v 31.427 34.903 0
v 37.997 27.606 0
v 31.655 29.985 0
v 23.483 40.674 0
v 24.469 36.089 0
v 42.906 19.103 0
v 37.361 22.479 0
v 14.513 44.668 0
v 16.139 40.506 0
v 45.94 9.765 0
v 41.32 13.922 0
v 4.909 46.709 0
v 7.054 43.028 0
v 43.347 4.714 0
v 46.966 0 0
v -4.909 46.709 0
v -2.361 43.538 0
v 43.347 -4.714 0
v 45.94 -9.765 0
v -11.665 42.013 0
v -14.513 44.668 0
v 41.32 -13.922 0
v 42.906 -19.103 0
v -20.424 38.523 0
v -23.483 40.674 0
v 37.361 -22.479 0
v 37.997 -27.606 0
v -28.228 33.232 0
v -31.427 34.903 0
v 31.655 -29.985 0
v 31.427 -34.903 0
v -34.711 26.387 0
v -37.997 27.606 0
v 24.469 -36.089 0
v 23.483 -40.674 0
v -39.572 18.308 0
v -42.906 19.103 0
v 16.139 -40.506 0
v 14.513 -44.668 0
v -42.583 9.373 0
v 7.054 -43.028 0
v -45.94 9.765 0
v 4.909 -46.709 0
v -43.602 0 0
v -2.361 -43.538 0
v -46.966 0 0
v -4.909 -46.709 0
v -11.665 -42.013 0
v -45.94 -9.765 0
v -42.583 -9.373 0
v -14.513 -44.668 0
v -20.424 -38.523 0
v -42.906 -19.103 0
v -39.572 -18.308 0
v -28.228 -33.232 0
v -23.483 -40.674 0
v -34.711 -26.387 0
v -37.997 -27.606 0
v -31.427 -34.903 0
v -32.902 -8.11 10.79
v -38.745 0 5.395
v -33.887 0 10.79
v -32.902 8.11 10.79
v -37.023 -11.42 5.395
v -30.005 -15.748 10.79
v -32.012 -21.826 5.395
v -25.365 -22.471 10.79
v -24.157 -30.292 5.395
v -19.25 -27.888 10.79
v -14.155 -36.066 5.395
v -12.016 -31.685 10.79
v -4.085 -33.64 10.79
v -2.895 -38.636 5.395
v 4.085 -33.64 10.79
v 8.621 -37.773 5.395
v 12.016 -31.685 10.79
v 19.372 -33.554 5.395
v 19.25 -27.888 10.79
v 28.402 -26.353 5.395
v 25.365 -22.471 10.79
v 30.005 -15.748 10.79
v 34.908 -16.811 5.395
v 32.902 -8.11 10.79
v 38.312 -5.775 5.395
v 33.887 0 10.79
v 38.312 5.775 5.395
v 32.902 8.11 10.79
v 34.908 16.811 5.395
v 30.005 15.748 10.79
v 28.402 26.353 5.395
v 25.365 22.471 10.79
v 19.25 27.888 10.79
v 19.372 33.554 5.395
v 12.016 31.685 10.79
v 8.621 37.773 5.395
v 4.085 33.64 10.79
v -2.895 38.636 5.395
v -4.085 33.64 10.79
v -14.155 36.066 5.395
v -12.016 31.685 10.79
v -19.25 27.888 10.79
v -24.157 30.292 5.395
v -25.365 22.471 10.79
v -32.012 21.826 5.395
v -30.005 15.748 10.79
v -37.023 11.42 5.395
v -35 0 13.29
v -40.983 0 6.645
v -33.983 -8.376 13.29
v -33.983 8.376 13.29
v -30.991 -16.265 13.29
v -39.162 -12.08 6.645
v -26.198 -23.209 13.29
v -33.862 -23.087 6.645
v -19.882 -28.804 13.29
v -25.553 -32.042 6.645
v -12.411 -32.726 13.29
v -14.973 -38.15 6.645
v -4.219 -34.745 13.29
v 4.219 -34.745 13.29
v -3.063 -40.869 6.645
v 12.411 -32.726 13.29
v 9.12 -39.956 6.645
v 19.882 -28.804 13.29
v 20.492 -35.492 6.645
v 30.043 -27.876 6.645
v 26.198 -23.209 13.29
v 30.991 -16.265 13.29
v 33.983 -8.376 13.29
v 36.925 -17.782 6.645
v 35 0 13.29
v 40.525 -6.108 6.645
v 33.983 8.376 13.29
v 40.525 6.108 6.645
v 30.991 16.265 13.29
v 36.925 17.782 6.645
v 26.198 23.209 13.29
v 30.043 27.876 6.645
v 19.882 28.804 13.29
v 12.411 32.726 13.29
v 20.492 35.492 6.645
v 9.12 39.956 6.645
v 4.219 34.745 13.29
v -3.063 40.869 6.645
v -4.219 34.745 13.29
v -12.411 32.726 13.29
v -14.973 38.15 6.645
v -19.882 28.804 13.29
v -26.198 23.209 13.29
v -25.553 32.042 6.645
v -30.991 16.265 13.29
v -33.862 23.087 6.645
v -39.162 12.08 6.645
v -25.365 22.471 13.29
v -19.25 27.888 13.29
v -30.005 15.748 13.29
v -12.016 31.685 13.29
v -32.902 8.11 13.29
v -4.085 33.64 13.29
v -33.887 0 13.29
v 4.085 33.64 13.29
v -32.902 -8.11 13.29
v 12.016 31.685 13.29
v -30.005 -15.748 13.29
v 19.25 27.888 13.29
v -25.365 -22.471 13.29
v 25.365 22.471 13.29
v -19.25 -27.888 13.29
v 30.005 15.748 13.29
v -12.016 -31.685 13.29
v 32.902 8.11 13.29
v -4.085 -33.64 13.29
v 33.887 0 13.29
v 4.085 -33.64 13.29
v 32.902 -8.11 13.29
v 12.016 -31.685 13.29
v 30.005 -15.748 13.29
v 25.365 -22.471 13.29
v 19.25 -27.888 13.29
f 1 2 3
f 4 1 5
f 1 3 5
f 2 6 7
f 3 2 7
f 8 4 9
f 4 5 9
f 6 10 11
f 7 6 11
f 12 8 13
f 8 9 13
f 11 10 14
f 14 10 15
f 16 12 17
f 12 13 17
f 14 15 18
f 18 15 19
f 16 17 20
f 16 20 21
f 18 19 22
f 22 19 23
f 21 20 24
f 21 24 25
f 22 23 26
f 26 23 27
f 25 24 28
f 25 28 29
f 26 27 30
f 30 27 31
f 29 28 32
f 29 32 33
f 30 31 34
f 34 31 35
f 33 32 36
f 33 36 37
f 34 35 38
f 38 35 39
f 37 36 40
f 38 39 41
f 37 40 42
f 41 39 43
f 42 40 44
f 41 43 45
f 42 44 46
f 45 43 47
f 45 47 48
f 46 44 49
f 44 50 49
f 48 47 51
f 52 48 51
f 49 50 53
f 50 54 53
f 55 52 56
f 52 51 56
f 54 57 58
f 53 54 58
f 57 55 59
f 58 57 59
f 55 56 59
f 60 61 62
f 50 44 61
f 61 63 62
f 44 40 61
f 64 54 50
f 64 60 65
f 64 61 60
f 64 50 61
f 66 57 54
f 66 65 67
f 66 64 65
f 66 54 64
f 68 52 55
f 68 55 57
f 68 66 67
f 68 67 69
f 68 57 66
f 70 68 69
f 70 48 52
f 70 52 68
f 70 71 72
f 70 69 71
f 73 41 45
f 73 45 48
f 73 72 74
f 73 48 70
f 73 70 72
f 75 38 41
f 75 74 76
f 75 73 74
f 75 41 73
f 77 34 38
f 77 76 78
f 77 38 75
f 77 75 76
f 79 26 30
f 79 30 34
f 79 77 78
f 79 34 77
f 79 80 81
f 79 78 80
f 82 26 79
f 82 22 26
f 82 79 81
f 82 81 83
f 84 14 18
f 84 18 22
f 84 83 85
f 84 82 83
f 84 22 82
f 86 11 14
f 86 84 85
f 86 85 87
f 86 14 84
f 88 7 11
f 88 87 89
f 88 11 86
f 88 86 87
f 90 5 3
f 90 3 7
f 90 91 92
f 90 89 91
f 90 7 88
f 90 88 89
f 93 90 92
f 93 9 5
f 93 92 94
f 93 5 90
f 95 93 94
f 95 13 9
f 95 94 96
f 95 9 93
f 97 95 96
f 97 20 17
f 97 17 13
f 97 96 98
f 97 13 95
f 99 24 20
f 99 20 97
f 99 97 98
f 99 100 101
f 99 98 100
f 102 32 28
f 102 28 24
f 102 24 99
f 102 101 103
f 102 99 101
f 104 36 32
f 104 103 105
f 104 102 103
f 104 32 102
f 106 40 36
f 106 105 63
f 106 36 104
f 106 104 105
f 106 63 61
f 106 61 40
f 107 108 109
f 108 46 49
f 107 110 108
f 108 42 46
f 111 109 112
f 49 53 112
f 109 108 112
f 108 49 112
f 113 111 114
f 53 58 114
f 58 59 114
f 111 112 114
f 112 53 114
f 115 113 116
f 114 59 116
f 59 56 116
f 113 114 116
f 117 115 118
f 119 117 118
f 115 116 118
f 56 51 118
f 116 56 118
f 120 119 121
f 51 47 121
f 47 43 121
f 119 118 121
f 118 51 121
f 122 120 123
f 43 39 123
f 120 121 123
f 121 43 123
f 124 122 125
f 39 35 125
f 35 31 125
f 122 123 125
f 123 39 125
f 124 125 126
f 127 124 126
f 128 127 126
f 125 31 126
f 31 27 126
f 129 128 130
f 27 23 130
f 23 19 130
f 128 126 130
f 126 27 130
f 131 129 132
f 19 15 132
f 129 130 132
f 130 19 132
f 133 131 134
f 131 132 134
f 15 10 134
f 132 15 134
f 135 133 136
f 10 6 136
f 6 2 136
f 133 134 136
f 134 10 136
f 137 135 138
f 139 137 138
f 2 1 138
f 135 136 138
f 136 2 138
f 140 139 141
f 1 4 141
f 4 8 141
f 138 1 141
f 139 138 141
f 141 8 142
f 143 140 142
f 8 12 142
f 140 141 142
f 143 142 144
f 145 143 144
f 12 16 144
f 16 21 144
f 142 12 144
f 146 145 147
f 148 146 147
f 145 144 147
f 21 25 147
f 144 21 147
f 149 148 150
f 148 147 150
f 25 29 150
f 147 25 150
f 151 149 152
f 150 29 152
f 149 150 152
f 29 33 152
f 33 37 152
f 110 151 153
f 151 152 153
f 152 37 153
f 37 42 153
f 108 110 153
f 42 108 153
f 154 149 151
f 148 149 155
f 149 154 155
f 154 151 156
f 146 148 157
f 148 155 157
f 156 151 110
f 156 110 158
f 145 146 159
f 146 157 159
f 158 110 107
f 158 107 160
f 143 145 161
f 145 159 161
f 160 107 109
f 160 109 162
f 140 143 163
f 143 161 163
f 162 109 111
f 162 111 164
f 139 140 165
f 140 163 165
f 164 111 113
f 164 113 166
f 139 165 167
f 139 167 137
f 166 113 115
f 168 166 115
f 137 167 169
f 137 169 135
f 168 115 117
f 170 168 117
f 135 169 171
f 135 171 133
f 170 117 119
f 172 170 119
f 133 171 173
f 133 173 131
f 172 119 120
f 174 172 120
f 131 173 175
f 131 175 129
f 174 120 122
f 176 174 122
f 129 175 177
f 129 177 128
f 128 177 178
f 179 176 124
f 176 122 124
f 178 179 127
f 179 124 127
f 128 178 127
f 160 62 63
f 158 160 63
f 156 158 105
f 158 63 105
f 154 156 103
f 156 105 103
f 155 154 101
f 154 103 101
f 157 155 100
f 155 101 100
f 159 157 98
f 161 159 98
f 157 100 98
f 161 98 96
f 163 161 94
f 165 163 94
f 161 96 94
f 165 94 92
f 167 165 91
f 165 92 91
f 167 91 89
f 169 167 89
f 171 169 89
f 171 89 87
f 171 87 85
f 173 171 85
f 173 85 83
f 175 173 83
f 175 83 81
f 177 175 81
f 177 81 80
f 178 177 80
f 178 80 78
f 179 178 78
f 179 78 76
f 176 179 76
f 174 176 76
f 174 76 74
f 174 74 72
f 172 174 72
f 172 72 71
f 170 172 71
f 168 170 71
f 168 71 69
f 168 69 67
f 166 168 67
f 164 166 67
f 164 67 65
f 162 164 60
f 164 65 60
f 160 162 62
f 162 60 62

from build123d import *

# Parameters (mm, degrees)
F2_T     = -2.5
F3_DEPTH = 25
F4_DEPTH = 25
F5_DEPTH = 27.501


with BuildPart() as f1:
    # F0 (on Front) → F1 (revolve)
    with BuildSketch(Plane.XZ):
        Polygon((0, 0), (0, 13.29), (-35, 13.29), (-46.9663697487, 0), align=None)
    revolve(axis=Axis((0, 0, 32.7267305849), (0, 0, 1)))

    # F2
    f2_openings = [f1.faces().sort_by_distance(p)[0] for p in [
        (0, 0, 0),
    ]]
    offset(amount=F2_T, openings=f2_openings)

    # F3 (add): a face of the model
    f3_faces = [f1.faces().sort_by_distance(p)[0] for p in [
        (0, 0, 10.79),
    ]]
    extrude(f3_faces, amount=F3_DEPTH)

    # F4 (add): a face of the model
    f4_faces = [f1.faces().sort_by_distance(p)[0] for p in [
        (0, 0, -14.21),
    ]]
    extrude(f4_faces, amount=-F4_DEPTH)

    # F5 (cut, through all): a face of the model
    f5_faces = [f1.faces().sort_by_distance(p)[0] for p in [
        (0, 0, -14.21),
    ]]
    extrude(f5_faces, amount=-F5_DEPTH, mode=Mode.SUBTRACT)


solid = f1.part
